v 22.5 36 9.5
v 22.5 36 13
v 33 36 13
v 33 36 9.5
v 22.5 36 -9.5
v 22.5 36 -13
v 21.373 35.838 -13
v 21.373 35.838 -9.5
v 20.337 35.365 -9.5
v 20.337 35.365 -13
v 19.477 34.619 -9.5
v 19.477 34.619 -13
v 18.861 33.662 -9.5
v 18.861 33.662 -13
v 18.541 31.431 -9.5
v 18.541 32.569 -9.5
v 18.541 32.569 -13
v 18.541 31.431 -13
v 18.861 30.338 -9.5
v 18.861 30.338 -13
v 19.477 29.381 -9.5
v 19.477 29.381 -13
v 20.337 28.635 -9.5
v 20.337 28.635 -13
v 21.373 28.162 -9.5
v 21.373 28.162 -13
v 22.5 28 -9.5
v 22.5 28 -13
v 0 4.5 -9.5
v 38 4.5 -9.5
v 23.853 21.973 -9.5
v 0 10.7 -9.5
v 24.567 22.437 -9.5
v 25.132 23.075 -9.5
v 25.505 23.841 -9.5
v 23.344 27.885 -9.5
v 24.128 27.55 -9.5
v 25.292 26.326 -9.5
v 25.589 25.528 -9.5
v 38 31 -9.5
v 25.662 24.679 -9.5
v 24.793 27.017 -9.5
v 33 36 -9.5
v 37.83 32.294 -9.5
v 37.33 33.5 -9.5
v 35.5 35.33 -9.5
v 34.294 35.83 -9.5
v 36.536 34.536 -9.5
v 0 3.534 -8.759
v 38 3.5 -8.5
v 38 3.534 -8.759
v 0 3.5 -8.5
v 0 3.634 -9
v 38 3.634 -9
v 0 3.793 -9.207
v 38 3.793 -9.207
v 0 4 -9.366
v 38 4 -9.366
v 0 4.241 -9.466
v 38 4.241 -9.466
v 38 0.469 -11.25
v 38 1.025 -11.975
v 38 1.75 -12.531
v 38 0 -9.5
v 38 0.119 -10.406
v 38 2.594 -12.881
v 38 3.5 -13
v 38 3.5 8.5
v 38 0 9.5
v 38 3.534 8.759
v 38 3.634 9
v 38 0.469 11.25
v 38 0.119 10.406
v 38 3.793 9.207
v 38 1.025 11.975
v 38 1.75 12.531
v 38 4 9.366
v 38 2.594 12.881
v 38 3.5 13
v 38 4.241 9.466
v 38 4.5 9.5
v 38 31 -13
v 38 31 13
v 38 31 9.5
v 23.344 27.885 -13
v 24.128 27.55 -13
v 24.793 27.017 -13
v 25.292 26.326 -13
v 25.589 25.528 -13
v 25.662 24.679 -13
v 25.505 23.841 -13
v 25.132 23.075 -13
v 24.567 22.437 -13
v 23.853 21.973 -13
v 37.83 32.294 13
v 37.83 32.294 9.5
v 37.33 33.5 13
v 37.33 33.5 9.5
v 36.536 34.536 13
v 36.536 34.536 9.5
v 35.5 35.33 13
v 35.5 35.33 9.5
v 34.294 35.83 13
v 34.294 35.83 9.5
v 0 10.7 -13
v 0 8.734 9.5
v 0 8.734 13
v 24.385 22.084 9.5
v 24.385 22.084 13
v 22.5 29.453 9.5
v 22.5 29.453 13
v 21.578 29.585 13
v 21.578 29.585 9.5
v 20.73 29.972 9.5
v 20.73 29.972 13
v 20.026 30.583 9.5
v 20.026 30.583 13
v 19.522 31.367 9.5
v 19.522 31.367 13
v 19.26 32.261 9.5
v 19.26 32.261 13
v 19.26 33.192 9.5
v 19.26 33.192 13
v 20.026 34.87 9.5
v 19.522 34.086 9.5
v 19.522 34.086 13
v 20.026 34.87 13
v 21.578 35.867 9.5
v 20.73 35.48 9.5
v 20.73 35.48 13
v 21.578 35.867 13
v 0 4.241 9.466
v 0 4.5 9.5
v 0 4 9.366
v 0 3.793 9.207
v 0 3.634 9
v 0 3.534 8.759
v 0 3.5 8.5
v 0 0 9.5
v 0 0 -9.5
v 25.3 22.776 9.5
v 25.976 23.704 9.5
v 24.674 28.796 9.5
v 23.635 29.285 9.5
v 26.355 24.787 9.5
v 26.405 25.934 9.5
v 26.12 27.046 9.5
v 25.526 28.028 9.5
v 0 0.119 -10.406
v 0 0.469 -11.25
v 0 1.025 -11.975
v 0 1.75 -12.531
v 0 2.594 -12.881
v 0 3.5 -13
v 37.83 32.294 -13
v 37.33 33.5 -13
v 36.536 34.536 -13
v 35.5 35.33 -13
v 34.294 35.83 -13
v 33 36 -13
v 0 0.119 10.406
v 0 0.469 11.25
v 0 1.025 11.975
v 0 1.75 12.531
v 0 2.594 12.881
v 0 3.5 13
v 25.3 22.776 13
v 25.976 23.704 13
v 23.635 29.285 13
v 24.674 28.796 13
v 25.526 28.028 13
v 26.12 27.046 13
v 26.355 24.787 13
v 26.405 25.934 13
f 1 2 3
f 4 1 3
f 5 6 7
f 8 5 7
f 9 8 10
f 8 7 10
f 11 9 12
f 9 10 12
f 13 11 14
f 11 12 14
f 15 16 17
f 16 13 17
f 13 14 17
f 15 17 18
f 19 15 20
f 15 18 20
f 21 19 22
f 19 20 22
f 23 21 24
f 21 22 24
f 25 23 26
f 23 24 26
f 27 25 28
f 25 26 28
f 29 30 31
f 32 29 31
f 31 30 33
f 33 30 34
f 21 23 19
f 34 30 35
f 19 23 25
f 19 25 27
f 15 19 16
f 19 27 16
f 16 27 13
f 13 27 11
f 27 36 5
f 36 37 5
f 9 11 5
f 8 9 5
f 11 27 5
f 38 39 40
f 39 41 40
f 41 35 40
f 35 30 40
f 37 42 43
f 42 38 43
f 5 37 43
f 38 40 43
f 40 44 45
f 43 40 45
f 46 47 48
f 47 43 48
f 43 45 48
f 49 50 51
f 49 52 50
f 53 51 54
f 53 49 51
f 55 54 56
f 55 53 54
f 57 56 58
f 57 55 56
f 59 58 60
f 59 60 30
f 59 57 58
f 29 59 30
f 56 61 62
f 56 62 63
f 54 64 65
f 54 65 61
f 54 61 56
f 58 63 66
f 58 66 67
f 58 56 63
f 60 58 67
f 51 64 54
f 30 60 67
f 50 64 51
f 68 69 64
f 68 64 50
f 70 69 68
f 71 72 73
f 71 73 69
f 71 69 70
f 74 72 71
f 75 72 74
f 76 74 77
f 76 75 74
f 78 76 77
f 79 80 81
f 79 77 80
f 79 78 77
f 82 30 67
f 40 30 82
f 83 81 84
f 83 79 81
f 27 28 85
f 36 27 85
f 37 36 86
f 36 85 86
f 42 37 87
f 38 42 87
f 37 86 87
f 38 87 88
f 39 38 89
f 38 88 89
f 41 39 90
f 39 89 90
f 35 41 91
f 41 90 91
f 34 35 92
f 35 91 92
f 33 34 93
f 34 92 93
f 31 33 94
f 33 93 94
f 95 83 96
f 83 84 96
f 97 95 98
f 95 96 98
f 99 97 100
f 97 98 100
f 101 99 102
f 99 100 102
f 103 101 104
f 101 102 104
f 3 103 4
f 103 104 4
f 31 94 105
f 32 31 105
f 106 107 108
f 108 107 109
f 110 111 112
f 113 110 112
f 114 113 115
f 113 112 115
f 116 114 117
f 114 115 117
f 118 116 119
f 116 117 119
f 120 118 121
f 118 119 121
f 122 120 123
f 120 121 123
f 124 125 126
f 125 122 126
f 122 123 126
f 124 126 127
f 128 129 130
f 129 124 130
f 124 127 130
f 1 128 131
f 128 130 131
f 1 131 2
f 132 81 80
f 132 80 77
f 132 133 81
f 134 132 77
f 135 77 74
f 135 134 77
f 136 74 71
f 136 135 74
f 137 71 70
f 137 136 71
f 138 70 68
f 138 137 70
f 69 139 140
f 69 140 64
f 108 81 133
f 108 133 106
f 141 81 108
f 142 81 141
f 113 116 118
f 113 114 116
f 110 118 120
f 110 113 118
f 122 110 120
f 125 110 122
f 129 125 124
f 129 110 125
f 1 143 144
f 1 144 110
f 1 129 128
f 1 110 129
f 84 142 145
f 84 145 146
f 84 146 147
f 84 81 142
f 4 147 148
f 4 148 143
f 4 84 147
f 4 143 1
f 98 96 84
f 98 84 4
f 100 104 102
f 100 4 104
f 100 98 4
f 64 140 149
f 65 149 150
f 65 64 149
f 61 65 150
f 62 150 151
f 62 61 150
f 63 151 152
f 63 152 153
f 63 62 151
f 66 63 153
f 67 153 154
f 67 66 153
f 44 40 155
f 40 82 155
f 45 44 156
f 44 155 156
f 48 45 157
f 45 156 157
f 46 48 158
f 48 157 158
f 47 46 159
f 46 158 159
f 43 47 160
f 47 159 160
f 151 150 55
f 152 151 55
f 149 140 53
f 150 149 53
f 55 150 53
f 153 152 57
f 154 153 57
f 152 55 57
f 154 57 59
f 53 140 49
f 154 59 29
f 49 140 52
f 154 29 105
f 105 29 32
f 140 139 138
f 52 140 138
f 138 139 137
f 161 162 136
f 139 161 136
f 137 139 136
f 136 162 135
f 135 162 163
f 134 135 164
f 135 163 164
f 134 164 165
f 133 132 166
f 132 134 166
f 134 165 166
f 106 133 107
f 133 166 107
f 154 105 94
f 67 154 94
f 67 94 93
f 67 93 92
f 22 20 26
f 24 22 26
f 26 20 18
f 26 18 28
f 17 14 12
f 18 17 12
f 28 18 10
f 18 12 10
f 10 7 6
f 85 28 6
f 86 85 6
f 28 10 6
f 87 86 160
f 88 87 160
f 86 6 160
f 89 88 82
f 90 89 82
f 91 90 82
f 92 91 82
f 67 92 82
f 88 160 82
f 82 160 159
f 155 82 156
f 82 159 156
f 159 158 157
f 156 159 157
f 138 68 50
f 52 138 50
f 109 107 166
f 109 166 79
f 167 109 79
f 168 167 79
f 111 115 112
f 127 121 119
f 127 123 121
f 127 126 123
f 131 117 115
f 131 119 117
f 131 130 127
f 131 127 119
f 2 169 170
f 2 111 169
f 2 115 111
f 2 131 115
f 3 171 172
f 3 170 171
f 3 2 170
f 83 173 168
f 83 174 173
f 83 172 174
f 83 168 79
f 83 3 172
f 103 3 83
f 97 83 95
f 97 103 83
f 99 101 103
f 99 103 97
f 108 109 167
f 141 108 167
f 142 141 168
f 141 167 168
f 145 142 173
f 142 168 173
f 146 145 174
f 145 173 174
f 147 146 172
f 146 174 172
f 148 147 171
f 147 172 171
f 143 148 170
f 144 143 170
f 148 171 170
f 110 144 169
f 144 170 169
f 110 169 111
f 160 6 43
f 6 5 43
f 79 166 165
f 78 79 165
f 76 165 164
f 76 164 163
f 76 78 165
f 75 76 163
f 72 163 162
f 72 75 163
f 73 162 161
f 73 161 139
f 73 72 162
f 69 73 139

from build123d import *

# Parameters (mm, degrees)
SKETCH1_W           = 38
SKETCH1_H           = 36
BOSS_EXTRUDE1_DEPTH = 26
SKETCH2_W           = 19
SKETCH2_H           = 32.5
CUT_EXTRUDE1_DEPTH  = 54.935146241
CUT_EXTRUDE2_REACH  = 60.447
CUT_EXTRUDE3_REACH  = 60.447
FILLET1_R           = 1
FILLET2_R           = 3.5
FILLET3_R           = 5


with BuildPart() as part:
    # Sketch1 → Boss-Extrude1 (new body)
    with BuildSketch(Plane.XY.offset(13)):
        with Locations((19, 18)):
            Rectangle(SKETCH1_W, SKETCH1_H)
    extrude(amount=-BOSS_EXTRUDE1_DEPTH)

    # Sketch2 → Cut-Extrude1 (cut, through all)
    with BuildSketch(Plane(origin=(38, 0, 0), x_dir=(0, 0, -1), z_dir=(1, 0, 0))):
        with Locations((0, 19.75)):
            Rectangle(SKETCH2_W, SKETCH2_H)
    extrude(amount=-CUT_EXTRUDE1_DEPTH, mode=Mode.SUBTRACT)

    # Sketch3 → Cut-Extrude2 (cut, up to next)
    with BuildSketch(Plane.XY.offset(13), mode=Mode.PRIVATE) as cut_extrude2_sk1:
        with BuildLine():
            Line((22.5, 36), (0, 36))
            Line((0, 36), (0, 8.734288837))
            Line((0, 8.734288837), (24.385099457, 22.083618886))
            ThreePointArc((24.385099457, 22.083618886), (26.303250734, 26.500012997), (22.5, 29.45282947))
            ThreePointArc((22.5, 29.45282947), (19.226414735, 32.726414735), (22.5, 36))
        make_face()
    cut_extrude2_tool1 = extrude(cut_extrude2_sk1.sketch, amount=-CUT_EXTRUDE2_REACH, mode=Mode.PRIVATE) & part.part
    add(cut_extrude2_tool1.solids().sort_by_distance((10.485992, 24.898976, 13))[0], mode=Mode.SUBTRACT)

    # Sketch4 → Cut-Extrude3 (cut, up to next)
    with BuildSketch(Plane(origin=(0, 0, -13), x_dir=(-1, 0, 0), z_dir=(0, 0, -1)), mode=Mode.PRIVATE) as cut_extrude3_sk1:
        with BuildLine():
            Line((-23.85253982, 21.972620507), (0, 10.7))
            Line((0, 10.7), (0, 36))
            Line((0, 36), (-22.5, 36))
            ThreePointArc((-22.5, 36), (-18.5, 32), (-22.5, 28))
            ThreePointArc((-22.5, 28), (-25.588635116, 25.527643349), (-23.85253982, 21.972620507))
        make_face()
    cut_extrude3_tool1 = extrude(cut_extrude3_sk1.sketch, amount=-CUT_EXTRUDE3_REACH, mode=Mode.PRIVATE) & part.part
    add(cut_extrude3_tool1.solids().sort_by_distance((10.140401, 25.382196, -13))[0], mode=Mode.SUBTRACT)

    # Fillet1
    fillet1_edges = [part.edges().sort_by_distance(p)[0] for p in [
        (19, 3.5, -9.5),
        (19, 3.5, 9.5),
    ]]
    fillet(fillet1_edges, radius=FILLET1_R)

    # Fillet2
    fillet2_edges = [part.edges().sort_by_distance(p)[0] for p in [
        (19, 0, -13),
        (19, 0, 13),
    ]]
    fillet(fillet2_edges, radius=FILLET2_R)

    # Fillet3
    fillet3_edges = [part.edges().sort_by_distance(p)[0] for p in [
        (38, 36, 11.25),
        (38, 36, -11.25),
    ]]
    fillet(fillet3_edges, radius=FILLET3_R)


solid = part.part
